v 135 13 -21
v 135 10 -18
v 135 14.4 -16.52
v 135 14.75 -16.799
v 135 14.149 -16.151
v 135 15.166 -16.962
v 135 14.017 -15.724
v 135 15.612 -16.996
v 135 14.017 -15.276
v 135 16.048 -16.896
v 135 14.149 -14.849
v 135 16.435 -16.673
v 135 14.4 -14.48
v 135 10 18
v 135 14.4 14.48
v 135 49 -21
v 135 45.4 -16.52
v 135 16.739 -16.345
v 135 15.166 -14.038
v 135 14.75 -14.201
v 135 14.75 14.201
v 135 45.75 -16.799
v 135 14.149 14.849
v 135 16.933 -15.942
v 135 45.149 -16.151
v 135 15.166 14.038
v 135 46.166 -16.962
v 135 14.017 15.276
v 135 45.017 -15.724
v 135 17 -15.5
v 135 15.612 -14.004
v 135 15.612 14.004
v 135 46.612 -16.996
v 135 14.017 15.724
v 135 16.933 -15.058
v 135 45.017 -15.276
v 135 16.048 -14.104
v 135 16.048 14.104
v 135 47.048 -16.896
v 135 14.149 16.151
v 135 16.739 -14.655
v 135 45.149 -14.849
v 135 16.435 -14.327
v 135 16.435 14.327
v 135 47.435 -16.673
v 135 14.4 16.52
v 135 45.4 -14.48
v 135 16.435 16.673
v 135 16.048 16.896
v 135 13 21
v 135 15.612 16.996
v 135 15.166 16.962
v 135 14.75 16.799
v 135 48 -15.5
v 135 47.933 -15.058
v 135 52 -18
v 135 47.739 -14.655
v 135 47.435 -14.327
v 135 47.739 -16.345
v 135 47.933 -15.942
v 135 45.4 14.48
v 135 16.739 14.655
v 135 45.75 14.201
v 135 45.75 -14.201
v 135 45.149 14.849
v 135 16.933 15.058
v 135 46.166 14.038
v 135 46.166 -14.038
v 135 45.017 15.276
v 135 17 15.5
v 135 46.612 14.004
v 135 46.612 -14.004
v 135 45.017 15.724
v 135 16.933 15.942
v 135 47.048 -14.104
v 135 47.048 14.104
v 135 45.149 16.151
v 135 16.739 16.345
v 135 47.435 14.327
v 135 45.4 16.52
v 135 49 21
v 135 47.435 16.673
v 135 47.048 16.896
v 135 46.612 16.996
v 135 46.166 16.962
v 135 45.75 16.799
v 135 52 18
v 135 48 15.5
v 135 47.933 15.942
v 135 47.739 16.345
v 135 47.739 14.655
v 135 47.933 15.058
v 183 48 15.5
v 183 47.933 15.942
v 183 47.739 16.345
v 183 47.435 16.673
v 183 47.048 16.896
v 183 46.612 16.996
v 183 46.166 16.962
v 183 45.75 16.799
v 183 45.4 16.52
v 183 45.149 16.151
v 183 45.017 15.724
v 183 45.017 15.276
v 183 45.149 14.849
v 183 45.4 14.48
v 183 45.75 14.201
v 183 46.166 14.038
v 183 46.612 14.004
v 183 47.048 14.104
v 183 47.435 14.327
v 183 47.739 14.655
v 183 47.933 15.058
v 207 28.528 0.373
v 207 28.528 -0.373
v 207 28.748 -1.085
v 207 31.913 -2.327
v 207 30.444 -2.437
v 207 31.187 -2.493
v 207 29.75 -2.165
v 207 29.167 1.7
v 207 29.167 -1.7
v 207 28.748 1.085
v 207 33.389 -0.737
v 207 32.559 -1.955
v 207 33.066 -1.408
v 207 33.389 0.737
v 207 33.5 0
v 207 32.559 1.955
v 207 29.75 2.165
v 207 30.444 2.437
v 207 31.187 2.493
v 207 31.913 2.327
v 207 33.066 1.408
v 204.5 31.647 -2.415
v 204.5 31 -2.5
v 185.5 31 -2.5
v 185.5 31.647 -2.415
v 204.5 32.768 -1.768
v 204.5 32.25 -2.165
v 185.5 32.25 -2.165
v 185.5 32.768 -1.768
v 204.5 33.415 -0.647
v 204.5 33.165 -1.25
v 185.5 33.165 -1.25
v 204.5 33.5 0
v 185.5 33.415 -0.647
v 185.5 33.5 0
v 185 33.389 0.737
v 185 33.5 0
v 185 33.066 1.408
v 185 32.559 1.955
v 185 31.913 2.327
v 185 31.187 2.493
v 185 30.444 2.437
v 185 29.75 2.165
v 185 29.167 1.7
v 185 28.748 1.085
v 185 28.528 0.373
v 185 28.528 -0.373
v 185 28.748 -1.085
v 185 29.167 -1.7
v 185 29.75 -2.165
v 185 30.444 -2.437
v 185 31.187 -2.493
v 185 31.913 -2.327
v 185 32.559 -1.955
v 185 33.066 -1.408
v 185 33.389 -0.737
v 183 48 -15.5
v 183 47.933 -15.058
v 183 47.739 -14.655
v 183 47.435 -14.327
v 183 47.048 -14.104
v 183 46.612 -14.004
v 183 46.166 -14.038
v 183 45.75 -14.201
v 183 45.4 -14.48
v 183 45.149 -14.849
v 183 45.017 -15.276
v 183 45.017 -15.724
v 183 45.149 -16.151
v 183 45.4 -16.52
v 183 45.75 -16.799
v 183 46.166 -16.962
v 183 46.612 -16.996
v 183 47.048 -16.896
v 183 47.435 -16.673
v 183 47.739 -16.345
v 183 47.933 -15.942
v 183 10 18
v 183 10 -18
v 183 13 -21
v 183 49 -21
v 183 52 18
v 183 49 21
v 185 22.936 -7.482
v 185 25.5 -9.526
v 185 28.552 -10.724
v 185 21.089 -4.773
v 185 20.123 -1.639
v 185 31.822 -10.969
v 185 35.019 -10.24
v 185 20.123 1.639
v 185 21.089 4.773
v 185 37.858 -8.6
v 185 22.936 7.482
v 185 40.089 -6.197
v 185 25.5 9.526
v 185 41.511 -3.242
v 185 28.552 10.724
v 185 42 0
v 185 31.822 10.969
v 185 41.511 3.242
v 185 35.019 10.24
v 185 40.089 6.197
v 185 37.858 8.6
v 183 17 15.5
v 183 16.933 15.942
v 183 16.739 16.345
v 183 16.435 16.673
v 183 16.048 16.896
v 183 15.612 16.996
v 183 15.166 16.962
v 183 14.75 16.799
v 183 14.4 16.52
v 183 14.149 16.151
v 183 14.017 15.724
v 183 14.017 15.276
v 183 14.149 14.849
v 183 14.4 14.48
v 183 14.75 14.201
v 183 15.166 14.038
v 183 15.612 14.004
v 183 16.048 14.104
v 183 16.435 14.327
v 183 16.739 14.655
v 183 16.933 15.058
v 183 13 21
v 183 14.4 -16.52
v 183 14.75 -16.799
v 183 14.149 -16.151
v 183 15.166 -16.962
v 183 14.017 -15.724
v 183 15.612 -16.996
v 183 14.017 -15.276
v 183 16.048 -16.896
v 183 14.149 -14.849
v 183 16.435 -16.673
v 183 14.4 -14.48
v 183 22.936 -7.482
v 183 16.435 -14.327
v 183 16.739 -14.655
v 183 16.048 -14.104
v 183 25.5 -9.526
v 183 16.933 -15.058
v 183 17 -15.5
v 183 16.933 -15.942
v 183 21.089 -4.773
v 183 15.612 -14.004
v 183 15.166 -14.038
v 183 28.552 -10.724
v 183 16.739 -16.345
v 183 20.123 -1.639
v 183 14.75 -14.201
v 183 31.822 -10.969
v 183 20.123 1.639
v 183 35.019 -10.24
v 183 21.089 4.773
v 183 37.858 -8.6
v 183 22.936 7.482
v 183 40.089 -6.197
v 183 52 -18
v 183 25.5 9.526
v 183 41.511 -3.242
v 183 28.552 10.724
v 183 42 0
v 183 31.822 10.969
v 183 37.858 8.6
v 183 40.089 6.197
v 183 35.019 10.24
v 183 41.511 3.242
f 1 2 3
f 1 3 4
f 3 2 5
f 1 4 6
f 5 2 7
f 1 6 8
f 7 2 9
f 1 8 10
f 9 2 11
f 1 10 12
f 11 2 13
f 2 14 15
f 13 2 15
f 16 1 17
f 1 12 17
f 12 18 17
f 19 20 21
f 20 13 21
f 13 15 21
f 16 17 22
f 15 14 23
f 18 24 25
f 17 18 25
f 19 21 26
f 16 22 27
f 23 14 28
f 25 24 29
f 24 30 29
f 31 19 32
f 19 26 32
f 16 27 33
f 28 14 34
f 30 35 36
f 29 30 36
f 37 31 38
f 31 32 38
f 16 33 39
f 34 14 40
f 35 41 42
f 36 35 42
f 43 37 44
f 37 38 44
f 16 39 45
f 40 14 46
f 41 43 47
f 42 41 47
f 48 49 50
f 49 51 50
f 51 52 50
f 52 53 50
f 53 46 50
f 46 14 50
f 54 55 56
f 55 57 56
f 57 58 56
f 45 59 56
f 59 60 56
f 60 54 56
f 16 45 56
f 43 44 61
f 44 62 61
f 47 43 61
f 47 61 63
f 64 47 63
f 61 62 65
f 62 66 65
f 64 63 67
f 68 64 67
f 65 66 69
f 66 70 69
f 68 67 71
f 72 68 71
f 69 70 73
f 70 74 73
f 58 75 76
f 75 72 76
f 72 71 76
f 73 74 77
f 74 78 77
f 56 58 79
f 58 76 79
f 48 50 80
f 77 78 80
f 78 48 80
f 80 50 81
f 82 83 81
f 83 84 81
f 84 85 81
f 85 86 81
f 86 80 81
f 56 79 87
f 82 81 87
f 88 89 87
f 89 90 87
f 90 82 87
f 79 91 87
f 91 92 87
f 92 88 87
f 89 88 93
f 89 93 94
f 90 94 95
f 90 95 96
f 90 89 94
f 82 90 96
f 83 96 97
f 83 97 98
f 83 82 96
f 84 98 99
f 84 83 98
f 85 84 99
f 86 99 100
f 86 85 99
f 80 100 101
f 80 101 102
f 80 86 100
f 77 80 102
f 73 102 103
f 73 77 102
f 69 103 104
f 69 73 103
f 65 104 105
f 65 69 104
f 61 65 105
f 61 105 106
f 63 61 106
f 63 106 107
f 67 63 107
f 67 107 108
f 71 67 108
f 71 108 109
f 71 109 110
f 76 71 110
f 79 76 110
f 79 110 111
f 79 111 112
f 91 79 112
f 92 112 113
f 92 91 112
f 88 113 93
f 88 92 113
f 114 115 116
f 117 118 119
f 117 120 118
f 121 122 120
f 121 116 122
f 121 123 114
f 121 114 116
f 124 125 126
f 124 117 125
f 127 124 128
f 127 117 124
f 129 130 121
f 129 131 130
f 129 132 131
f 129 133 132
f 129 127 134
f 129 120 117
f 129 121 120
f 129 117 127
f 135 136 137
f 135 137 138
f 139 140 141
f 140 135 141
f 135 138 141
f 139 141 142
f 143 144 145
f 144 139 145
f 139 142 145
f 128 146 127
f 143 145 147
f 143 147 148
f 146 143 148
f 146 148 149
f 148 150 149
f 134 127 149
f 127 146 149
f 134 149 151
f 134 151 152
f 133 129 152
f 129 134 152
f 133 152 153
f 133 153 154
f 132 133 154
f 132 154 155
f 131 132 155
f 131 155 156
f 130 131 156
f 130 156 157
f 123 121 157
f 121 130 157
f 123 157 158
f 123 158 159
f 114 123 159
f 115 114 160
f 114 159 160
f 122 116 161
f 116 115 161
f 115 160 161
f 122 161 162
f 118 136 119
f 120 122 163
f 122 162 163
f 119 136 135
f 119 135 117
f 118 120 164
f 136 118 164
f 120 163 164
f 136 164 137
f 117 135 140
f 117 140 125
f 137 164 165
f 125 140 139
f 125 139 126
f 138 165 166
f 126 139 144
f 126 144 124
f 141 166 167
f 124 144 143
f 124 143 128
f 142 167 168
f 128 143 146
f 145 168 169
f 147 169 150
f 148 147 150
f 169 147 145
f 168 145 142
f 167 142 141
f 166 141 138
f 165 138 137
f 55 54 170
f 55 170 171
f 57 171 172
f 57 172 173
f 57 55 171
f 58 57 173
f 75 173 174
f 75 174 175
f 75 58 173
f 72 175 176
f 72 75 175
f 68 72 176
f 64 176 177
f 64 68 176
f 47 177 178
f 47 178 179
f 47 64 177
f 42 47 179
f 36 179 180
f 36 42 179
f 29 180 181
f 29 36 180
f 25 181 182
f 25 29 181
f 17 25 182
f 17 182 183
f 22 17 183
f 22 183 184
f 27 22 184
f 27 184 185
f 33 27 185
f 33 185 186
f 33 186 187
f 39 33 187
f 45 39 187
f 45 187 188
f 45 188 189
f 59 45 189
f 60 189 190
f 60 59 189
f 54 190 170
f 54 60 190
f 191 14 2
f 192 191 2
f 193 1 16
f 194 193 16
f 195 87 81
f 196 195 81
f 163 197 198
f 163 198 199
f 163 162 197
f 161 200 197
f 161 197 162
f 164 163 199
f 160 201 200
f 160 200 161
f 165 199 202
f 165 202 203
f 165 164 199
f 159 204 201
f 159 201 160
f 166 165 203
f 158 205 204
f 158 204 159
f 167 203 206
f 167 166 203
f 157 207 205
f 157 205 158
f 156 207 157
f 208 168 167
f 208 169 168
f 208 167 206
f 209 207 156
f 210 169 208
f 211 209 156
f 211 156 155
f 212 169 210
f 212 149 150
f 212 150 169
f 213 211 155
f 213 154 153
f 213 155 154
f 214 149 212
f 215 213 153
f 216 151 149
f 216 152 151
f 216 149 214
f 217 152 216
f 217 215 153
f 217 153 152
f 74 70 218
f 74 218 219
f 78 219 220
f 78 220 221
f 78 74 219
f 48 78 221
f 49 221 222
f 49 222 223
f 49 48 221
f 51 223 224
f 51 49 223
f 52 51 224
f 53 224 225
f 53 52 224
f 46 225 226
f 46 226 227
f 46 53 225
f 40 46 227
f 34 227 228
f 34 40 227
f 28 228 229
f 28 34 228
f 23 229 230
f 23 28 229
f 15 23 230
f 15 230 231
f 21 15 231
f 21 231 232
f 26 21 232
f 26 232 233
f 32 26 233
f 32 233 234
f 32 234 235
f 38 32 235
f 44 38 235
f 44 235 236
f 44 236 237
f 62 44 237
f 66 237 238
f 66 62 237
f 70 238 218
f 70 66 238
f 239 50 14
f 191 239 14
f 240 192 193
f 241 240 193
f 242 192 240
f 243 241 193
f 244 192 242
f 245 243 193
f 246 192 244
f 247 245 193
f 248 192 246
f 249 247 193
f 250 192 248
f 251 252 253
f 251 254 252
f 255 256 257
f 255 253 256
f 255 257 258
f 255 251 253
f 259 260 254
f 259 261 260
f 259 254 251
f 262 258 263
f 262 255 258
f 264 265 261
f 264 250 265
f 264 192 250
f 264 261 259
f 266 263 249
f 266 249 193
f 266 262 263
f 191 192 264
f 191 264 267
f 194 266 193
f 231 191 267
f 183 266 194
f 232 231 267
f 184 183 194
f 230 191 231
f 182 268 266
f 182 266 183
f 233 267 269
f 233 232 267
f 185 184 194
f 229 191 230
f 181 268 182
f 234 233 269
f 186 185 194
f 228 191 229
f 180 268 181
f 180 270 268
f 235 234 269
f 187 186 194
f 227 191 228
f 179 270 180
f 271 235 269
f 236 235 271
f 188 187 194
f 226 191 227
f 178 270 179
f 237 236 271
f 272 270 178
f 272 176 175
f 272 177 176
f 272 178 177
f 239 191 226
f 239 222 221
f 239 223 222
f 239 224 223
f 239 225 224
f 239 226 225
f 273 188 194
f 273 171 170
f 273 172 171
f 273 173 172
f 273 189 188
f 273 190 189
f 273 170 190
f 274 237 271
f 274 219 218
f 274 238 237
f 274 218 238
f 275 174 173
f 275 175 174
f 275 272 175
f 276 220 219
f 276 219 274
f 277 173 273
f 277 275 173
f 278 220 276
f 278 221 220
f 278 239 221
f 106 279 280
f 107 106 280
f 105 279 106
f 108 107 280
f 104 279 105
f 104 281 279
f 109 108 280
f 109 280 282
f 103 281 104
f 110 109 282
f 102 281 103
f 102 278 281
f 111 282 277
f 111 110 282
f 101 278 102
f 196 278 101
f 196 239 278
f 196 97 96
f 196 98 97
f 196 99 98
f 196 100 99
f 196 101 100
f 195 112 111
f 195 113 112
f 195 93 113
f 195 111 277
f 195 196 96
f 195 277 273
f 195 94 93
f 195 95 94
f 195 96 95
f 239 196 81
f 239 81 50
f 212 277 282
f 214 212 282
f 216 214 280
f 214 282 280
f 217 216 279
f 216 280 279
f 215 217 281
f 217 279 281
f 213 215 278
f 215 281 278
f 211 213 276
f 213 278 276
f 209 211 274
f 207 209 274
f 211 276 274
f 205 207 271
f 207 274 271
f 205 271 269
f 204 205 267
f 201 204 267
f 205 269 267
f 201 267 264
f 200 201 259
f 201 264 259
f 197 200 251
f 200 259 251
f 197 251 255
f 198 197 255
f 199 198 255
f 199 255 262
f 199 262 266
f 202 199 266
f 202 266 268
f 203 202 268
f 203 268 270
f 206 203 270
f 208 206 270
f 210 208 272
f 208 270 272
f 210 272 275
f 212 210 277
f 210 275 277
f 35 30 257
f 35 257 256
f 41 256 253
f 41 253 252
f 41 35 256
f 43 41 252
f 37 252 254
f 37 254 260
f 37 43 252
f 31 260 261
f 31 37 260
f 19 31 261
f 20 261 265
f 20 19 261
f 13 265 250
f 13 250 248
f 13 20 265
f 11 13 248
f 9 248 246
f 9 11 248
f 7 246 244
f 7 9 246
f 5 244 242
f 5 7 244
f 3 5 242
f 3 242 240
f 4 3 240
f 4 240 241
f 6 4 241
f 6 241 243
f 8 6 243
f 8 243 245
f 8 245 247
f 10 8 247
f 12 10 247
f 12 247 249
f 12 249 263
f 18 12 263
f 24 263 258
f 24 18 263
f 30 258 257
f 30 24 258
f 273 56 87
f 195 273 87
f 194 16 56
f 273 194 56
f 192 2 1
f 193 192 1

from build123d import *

# Parameters (mm, degrees)
STOCK_AXIS_MASTER_1_START       = 135
STOCK_AXIS_MASTER_1_OUTLINE_R   = 1.5
STOCK_AXIS_MASTER_1_DEPTH       = 48
STOCK_AXIS_MASTER_1_START_2     = 185.5
STOCK_AXIS_MASTER_1_2_OUTLINE_R = 7.25
STOCK_AXIS_MASTER_1_2_DEPTH     = 19
STOCK_AXIS_MASTER_1_START_3     = 183
STOCK_AXIS_MASTER_1_3_OUTLINE_R = 11
STOCK_AXIS_MASTER_1_3_DEPTH     = 2
STOCK_AXIS_MASTER_1_START_4     = 185
STOCK_AXIS_MASTER_1_4_OUTLINE_R = 2.5
STOCK_AXIS_MASTER_1_4_DEPTH     = 22
CUT_EXTRUDE1_START              = -22
SKETCH1_R                       = 7.25
SKETCH1_R_2                     = 2.5
CUT_EXTRUDE1_DEPTH              = 22


# Read off the part's stored shape, not the designer's step: Stock-axis-master-1
with BuildPart() as part:
    # Stock-axis-master-1 outline → Stock-axis-master-1 (new body)
    with BuildSketch(Plane.YZ.offset(STOCK_AXIS_MASTER_1_START)):
        Polygon((49, -21), (52, -18), (52, 18), (49, 21), (13, 21), (10, 18), (10, -18), (13, -21), align=None)
        with Locations((15.5, -15.5)):
            Circle(STOCK_AXIS_MASTER_1_OUTLINE_R, mode=Mode.SUBTRACT)
        with Locations((46.5, -15.5)):
            Circle(STOCK_AXIS_MASTER_1_OUTLINE_R, mode=Mode.SUBTRACT)
        with Locations((15.5, 15.5)):
            Circle(STOCK_AXIS_MASTER_1_OUTLINE_R, mode=Mode.SUBTRACT)
        with Locations((46.5, 15.5)):
            Circle(STOCK_AXIS_MASTER_1_OUTLINE_R, mode=Mode.SUBTRACT)
    extrude(amount=STOCK_AXIS_MASTER_1_DEPTH)

    # Stock-axis-master-1 3 outline → Stock-axis-master-1 3 (add)
    with BuildSketch(Plane.YZ.offset(STOCK_AXIS_MASTER_1_START_3)):
        with Locations((31, 0)):
            Circle(STOCK_AXIS_MASTER_1_3_OUTLINE_R)
    extrude(amount=STOCK_AXIS_MASTER_1_3_DEPTH)



with BuildPart() as body_2:
    # Stock-axis-master-1 2 outline → Stock-axis-master-1 2 (new body)
    with BuildSketch(Plane.YZ.offset(STOCK_AXIS_MASTER_1_START_2)):
        with Locations((31, 0)):
            Circle(STOCK_AXIS_MASTER_1_2_OUTLINE_R)
    extrude(amount=STOCK_AXIS_MASTER_1_2_DEPTH)


with BuildPart() as part_1:
    add(part.part)

    add(body_2.part)  # Stock-axis-master-1 4 merges body 2
    # Stock-axis-master-1 4 outline → Stock-axis-master-1 4 (add)
    with BuildSketch(Plane.YZ.offset(STOCK_AXIS_MASTER_1_START_4)):
        with Locations((31, 0)):
            Circle(STOCK_AXIS_MASTER_1_4_OUTLINE_R)
    extrude(amount=STOCK_AXIS_MASTER_1_4_DEPTH)

    # Sketch1 → Cut-Extrude1 (cut)
    with BuildSketch(Plane(origin=(207, 0, 0), x_dir=(0, 0, -1), z_dir=(1, 0, 0)).offset(CUT_EXTRUDE1_START)):
        with Locations((0, 31)):
            Circle(SKETCH1_R)
        with Locations((0, 31)):
            Circle(SKETCH1_R_2, mode=Mode.SUBTRACT)
    extrude(amount=CUT_EXTRUDE1_DEPTH, mode=Mode.SUBTRACT)


solid = part_1.part
